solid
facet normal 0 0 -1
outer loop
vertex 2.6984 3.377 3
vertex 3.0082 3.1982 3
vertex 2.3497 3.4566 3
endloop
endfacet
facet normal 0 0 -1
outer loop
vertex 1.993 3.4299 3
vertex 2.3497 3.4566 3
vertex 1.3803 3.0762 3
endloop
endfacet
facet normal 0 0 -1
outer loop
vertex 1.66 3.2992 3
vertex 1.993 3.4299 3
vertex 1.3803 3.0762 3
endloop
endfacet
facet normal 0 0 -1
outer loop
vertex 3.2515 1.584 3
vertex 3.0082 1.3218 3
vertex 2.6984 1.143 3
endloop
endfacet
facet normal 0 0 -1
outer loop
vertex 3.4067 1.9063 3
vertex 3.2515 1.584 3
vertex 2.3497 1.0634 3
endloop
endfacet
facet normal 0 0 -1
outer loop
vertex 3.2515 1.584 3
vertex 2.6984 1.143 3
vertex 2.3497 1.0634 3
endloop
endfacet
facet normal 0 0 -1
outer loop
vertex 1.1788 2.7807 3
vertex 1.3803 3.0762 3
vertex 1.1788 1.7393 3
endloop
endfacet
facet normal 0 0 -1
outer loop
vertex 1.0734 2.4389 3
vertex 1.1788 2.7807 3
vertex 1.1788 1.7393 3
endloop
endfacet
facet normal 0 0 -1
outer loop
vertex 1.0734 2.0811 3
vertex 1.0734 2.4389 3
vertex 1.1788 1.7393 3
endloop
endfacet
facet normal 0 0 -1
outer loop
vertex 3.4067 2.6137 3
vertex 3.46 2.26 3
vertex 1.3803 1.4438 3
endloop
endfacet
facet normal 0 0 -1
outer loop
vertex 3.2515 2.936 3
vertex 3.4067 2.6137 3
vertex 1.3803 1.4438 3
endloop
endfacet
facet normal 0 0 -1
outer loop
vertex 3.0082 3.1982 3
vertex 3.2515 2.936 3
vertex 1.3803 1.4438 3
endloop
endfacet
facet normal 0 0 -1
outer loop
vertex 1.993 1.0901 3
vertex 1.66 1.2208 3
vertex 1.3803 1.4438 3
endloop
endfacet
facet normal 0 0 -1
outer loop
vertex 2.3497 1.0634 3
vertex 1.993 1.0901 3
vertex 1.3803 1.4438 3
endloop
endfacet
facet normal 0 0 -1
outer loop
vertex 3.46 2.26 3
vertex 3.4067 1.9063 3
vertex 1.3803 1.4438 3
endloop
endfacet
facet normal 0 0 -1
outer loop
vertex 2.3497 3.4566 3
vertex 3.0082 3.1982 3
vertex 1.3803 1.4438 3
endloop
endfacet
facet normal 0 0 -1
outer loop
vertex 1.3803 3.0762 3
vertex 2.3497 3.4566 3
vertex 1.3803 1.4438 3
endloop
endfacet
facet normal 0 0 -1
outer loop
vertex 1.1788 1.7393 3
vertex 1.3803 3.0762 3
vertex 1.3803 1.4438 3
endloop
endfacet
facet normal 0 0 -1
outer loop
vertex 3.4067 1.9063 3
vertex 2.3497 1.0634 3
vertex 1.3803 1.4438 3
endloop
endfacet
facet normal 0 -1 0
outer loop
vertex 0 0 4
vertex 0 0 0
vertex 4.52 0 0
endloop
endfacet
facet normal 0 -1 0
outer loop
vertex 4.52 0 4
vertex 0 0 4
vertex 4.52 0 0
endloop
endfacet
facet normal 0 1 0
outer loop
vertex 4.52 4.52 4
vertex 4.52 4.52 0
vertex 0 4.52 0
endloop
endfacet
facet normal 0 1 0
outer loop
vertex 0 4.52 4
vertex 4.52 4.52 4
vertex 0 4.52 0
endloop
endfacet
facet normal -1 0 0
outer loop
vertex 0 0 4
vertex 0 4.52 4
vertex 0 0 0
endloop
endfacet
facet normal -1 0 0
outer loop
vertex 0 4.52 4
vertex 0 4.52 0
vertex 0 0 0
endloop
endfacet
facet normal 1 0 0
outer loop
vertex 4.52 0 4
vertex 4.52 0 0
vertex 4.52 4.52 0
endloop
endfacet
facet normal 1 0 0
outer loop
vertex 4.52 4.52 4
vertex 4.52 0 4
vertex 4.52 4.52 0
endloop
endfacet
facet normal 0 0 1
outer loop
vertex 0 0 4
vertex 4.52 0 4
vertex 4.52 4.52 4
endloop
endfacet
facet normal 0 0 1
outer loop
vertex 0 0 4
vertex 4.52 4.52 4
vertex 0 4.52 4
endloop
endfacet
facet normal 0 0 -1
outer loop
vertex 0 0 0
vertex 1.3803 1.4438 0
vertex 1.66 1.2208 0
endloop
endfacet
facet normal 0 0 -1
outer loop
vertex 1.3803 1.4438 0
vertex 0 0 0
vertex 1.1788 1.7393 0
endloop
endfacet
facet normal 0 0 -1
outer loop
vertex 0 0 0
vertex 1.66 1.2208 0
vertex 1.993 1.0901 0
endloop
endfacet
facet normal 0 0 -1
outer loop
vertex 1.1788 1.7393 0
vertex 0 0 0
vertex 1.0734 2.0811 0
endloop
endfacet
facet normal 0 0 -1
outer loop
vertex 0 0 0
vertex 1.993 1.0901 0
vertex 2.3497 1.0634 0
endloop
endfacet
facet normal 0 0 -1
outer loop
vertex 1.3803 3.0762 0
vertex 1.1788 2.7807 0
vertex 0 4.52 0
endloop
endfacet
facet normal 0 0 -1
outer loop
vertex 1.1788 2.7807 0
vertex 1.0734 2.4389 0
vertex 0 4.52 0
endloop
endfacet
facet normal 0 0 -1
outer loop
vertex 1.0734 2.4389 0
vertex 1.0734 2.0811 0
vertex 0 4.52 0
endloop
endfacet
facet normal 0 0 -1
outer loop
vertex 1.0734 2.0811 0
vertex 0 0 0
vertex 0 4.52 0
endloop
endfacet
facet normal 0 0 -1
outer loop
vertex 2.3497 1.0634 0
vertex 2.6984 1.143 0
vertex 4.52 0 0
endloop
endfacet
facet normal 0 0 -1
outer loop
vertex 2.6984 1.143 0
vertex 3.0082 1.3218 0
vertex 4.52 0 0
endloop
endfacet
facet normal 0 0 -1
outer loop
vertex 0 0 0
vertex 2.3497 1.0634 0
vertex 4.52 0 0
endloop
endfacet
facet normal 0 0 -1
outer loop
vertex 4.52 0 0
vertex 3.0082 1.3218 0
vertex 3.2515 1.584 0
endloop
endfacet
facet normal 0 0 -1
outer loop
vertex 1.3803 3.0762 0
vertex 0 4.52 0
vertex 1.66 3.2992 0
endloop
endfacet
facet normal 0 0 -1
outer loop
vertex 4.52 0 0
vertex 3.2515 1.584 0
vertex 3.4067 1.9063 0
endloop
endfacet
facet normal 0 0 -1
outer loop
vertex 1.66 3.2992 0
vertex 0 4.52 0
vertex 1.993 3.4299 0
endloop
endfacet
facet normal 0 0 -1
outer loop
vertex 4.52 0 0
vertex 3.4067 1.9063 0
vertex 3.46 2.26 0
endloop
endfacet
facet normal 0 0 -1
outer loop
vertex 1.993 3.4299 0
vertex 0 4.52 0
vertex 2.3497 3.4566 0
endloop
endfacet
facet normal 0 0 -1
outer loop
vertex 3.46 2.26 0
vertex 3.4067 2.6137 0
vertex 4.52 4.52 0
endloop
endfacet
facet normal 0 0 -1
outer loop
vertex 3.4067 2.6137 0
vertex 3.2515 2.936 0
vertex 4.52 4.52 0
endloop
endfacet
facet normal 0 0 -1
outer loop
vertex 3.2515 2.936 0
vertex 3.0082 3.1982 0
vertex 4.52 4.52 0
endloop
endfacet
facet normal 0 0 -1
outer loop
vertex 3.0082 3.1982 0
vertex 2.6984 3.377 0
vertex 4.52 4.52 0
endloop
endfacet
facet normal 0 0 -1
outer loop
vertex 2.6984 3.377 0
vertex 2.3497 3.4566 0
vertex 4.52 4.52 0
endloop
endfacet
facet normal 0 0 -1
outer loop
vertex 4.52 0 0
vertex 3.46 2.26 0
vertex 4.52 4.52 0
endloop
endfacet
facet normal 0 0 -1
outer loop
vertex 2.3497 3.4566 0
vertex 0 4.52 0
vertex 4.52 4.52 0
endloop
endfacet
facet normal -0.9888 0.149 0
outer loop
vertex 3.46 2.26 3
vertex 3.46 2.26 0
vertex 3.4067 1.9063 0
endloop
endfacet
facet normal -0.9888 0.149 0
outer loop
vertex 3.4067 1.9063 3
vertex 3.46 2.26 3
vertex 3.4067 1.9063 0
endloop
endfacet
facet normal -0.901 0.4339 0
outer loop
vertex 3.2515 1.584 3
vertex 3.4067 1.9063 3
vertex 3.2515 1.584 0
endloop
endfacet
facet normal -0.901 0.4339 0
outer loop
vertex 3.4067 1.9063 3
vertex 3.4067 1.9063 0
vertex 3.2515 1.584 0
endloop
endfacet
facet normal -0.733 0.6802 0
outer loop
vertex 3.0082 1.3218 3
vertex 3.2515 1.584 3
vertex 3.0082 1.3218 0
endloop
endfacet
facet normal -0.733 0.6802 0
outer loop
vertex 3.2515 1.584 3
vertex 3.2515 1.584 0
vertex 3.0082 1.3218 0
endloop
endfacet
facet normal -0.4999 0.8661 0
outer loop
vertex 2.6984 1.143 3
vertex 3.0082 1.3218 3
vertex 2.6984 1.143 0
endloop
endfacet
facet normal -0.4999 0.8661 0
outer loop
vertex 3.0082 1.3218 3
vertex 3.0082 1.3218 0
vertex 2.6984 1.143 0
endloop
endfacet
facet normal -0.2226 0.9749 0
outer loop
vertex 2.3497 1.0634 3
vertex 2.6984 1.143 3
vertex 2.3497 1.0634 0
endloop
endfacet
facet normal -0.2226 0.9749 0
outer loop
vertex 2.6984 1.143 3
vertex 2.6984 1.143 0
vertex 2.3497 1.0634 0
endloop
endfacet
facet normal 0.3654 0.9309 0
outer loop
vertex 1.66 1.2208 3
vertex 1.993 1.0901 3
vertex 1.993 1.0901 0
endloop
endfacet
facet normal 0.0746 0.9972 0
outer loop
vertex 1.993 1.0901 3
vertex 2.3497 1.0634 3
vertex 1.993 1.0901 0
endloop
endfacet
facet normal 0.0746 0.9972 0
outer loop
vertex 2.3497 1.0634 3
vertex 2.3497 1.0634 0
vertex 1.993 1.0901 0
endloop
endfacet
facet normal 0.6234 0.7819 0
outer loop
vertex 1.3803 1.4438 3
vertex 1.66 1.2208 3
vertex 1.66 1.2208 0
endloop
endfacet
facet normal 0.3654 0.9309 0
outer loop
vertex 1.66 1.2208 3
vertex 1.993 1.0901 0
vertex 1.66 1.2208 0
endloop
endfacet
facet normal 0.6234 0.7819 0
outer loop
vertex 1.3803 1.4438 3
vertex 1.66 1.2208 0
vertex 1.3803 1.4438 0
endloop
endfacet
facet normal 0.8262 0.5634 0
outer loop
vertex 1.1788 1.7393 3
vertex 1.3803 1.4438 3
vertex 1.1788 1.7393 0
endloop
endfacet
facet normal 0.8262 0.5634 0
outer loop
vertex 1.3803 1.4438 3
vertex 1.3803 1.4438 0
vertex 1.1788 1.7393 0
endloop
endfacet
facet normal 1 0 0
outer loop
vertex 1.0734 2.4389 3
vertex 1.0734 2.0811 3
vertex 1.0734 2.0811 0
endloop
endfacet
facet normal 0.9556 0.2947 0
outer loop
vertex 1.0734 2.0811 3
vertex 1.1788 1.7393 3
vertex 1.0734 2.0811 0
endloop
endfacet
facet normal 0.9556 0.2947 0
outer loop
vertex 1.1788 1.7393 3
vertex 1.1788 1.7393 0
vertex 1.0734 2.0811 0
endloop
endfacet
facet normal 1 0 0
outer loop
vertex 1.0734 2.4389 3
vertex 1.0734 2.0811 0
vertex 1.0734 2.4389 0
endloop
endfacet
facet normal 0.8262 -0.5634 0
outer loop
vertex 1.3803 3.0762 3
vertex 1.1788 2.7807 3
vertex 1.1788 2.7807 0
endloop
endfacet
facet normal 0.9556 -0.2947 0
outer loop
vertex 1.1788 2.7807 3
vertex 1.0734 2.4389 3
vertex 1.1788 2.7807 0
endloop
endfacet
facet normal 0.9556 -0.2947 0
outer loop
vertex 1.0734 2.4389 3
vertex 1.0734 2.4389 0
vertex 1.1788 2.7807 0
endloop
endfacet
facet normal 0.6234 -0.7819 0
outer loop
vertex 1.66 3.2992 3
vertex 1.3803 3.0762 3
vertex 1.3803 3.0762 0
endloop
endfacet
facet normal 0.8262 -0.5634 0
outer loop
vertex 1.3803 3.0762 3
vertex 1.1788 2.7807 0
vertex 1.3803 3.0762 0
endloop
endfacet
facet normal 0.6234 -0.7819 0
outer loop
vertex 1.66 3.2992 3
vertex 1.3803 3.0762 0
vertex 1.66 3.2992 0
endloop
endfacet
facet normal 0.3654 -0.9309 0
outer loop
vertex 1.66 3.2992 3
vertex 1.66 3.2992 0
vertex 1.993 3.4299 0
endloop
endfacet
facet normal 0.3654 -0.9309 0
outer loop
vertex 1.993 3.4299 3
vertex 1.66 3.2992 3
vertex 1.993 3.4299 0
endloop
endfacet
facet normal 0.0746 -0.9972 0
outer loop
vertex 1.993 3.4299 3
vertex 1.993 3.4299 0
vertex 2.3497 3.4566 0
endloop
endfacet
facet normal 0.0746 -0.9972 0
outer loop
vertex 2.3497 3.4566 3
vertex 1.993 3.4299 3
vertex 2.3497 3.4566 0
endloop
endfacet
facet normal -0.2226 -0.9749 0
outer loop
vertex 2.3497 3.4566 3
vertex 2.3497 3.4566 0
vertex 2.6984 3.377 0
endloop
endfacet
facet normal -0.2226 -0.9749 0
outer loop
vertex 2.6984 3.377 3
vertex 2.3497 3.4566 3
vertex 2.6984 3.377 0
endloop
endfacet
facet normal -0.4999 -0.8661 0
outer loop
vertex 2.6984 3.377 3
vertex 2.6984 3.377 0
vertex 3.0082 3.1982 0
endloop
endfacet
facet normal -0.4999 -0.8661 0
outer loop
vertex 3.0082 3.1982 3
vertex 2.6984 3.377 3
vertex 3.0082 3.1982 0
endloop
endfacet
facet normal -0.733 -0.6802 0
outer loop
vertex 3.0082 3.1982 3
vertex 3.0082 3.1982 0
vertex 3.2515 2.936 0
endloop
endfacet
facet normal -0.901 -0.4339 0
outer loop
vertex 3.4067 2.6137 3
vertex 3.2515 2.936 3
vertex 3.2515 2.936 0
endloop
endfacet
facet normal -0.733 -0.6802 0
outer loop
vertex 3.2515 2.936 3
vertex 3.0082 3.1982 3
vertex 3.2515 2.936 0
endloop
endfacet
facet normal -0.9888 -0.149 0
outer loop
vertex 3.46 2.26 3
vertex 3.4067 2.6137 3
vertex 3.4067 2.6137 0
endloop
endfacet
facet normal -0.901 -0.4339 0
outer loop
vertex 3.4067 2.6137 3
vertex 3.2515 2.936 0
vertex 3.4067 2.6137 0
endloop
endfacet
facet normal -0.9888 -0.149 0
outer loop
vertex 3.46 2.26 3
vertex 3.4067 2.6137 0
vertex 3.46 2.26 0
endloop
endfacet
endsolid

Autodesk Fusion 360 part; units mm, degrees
sketch "Sketch1" plane through (0, 0, 0) normal (0, 0, 1) x (1, 0, 0)
  line L0 (0, 0) -> (4.52, 0)
  line L1 (4.52, 0) -> (4.52, 4.52)
  line L2 (4.52, 4.52) -> (0, 4.52)
  line L3 (0, 4.52) -> (0, 0)
  line L4 (0, 4.52) -> (4.52, 0) construction
  line L5 (4.52, 4.52) -> (0, 0) construction
  circle A0 centre (2.26, 2.26) radius 1.2
  dimension "d1" = 4.52
  dimension "d2" = 4.52
  dimension "d3" = 2.4
extrude "Extrude1" add sketch "Sketch1" along normal blind 3
sketch "Sketch2" plane through (0, 0, 3) normal (0, 0, 1) x (-1, 0, 0)
  circle A0 centre (-2.26, -2.26) radius 1.2
  line L0 (0, -4.52) -> (0, 0)
  line L1 (0, 0) -> (-4.52, 0)
  line L2 (-4.52, 0) -> (-4.52, -4.52)
  line L3 (-4.52, -4.52) -> (0, -4.52)
extrude "Extrude2" add sketch "Sketch2" along normal blind 1 contours A0 | L0 L1 L2 L3
